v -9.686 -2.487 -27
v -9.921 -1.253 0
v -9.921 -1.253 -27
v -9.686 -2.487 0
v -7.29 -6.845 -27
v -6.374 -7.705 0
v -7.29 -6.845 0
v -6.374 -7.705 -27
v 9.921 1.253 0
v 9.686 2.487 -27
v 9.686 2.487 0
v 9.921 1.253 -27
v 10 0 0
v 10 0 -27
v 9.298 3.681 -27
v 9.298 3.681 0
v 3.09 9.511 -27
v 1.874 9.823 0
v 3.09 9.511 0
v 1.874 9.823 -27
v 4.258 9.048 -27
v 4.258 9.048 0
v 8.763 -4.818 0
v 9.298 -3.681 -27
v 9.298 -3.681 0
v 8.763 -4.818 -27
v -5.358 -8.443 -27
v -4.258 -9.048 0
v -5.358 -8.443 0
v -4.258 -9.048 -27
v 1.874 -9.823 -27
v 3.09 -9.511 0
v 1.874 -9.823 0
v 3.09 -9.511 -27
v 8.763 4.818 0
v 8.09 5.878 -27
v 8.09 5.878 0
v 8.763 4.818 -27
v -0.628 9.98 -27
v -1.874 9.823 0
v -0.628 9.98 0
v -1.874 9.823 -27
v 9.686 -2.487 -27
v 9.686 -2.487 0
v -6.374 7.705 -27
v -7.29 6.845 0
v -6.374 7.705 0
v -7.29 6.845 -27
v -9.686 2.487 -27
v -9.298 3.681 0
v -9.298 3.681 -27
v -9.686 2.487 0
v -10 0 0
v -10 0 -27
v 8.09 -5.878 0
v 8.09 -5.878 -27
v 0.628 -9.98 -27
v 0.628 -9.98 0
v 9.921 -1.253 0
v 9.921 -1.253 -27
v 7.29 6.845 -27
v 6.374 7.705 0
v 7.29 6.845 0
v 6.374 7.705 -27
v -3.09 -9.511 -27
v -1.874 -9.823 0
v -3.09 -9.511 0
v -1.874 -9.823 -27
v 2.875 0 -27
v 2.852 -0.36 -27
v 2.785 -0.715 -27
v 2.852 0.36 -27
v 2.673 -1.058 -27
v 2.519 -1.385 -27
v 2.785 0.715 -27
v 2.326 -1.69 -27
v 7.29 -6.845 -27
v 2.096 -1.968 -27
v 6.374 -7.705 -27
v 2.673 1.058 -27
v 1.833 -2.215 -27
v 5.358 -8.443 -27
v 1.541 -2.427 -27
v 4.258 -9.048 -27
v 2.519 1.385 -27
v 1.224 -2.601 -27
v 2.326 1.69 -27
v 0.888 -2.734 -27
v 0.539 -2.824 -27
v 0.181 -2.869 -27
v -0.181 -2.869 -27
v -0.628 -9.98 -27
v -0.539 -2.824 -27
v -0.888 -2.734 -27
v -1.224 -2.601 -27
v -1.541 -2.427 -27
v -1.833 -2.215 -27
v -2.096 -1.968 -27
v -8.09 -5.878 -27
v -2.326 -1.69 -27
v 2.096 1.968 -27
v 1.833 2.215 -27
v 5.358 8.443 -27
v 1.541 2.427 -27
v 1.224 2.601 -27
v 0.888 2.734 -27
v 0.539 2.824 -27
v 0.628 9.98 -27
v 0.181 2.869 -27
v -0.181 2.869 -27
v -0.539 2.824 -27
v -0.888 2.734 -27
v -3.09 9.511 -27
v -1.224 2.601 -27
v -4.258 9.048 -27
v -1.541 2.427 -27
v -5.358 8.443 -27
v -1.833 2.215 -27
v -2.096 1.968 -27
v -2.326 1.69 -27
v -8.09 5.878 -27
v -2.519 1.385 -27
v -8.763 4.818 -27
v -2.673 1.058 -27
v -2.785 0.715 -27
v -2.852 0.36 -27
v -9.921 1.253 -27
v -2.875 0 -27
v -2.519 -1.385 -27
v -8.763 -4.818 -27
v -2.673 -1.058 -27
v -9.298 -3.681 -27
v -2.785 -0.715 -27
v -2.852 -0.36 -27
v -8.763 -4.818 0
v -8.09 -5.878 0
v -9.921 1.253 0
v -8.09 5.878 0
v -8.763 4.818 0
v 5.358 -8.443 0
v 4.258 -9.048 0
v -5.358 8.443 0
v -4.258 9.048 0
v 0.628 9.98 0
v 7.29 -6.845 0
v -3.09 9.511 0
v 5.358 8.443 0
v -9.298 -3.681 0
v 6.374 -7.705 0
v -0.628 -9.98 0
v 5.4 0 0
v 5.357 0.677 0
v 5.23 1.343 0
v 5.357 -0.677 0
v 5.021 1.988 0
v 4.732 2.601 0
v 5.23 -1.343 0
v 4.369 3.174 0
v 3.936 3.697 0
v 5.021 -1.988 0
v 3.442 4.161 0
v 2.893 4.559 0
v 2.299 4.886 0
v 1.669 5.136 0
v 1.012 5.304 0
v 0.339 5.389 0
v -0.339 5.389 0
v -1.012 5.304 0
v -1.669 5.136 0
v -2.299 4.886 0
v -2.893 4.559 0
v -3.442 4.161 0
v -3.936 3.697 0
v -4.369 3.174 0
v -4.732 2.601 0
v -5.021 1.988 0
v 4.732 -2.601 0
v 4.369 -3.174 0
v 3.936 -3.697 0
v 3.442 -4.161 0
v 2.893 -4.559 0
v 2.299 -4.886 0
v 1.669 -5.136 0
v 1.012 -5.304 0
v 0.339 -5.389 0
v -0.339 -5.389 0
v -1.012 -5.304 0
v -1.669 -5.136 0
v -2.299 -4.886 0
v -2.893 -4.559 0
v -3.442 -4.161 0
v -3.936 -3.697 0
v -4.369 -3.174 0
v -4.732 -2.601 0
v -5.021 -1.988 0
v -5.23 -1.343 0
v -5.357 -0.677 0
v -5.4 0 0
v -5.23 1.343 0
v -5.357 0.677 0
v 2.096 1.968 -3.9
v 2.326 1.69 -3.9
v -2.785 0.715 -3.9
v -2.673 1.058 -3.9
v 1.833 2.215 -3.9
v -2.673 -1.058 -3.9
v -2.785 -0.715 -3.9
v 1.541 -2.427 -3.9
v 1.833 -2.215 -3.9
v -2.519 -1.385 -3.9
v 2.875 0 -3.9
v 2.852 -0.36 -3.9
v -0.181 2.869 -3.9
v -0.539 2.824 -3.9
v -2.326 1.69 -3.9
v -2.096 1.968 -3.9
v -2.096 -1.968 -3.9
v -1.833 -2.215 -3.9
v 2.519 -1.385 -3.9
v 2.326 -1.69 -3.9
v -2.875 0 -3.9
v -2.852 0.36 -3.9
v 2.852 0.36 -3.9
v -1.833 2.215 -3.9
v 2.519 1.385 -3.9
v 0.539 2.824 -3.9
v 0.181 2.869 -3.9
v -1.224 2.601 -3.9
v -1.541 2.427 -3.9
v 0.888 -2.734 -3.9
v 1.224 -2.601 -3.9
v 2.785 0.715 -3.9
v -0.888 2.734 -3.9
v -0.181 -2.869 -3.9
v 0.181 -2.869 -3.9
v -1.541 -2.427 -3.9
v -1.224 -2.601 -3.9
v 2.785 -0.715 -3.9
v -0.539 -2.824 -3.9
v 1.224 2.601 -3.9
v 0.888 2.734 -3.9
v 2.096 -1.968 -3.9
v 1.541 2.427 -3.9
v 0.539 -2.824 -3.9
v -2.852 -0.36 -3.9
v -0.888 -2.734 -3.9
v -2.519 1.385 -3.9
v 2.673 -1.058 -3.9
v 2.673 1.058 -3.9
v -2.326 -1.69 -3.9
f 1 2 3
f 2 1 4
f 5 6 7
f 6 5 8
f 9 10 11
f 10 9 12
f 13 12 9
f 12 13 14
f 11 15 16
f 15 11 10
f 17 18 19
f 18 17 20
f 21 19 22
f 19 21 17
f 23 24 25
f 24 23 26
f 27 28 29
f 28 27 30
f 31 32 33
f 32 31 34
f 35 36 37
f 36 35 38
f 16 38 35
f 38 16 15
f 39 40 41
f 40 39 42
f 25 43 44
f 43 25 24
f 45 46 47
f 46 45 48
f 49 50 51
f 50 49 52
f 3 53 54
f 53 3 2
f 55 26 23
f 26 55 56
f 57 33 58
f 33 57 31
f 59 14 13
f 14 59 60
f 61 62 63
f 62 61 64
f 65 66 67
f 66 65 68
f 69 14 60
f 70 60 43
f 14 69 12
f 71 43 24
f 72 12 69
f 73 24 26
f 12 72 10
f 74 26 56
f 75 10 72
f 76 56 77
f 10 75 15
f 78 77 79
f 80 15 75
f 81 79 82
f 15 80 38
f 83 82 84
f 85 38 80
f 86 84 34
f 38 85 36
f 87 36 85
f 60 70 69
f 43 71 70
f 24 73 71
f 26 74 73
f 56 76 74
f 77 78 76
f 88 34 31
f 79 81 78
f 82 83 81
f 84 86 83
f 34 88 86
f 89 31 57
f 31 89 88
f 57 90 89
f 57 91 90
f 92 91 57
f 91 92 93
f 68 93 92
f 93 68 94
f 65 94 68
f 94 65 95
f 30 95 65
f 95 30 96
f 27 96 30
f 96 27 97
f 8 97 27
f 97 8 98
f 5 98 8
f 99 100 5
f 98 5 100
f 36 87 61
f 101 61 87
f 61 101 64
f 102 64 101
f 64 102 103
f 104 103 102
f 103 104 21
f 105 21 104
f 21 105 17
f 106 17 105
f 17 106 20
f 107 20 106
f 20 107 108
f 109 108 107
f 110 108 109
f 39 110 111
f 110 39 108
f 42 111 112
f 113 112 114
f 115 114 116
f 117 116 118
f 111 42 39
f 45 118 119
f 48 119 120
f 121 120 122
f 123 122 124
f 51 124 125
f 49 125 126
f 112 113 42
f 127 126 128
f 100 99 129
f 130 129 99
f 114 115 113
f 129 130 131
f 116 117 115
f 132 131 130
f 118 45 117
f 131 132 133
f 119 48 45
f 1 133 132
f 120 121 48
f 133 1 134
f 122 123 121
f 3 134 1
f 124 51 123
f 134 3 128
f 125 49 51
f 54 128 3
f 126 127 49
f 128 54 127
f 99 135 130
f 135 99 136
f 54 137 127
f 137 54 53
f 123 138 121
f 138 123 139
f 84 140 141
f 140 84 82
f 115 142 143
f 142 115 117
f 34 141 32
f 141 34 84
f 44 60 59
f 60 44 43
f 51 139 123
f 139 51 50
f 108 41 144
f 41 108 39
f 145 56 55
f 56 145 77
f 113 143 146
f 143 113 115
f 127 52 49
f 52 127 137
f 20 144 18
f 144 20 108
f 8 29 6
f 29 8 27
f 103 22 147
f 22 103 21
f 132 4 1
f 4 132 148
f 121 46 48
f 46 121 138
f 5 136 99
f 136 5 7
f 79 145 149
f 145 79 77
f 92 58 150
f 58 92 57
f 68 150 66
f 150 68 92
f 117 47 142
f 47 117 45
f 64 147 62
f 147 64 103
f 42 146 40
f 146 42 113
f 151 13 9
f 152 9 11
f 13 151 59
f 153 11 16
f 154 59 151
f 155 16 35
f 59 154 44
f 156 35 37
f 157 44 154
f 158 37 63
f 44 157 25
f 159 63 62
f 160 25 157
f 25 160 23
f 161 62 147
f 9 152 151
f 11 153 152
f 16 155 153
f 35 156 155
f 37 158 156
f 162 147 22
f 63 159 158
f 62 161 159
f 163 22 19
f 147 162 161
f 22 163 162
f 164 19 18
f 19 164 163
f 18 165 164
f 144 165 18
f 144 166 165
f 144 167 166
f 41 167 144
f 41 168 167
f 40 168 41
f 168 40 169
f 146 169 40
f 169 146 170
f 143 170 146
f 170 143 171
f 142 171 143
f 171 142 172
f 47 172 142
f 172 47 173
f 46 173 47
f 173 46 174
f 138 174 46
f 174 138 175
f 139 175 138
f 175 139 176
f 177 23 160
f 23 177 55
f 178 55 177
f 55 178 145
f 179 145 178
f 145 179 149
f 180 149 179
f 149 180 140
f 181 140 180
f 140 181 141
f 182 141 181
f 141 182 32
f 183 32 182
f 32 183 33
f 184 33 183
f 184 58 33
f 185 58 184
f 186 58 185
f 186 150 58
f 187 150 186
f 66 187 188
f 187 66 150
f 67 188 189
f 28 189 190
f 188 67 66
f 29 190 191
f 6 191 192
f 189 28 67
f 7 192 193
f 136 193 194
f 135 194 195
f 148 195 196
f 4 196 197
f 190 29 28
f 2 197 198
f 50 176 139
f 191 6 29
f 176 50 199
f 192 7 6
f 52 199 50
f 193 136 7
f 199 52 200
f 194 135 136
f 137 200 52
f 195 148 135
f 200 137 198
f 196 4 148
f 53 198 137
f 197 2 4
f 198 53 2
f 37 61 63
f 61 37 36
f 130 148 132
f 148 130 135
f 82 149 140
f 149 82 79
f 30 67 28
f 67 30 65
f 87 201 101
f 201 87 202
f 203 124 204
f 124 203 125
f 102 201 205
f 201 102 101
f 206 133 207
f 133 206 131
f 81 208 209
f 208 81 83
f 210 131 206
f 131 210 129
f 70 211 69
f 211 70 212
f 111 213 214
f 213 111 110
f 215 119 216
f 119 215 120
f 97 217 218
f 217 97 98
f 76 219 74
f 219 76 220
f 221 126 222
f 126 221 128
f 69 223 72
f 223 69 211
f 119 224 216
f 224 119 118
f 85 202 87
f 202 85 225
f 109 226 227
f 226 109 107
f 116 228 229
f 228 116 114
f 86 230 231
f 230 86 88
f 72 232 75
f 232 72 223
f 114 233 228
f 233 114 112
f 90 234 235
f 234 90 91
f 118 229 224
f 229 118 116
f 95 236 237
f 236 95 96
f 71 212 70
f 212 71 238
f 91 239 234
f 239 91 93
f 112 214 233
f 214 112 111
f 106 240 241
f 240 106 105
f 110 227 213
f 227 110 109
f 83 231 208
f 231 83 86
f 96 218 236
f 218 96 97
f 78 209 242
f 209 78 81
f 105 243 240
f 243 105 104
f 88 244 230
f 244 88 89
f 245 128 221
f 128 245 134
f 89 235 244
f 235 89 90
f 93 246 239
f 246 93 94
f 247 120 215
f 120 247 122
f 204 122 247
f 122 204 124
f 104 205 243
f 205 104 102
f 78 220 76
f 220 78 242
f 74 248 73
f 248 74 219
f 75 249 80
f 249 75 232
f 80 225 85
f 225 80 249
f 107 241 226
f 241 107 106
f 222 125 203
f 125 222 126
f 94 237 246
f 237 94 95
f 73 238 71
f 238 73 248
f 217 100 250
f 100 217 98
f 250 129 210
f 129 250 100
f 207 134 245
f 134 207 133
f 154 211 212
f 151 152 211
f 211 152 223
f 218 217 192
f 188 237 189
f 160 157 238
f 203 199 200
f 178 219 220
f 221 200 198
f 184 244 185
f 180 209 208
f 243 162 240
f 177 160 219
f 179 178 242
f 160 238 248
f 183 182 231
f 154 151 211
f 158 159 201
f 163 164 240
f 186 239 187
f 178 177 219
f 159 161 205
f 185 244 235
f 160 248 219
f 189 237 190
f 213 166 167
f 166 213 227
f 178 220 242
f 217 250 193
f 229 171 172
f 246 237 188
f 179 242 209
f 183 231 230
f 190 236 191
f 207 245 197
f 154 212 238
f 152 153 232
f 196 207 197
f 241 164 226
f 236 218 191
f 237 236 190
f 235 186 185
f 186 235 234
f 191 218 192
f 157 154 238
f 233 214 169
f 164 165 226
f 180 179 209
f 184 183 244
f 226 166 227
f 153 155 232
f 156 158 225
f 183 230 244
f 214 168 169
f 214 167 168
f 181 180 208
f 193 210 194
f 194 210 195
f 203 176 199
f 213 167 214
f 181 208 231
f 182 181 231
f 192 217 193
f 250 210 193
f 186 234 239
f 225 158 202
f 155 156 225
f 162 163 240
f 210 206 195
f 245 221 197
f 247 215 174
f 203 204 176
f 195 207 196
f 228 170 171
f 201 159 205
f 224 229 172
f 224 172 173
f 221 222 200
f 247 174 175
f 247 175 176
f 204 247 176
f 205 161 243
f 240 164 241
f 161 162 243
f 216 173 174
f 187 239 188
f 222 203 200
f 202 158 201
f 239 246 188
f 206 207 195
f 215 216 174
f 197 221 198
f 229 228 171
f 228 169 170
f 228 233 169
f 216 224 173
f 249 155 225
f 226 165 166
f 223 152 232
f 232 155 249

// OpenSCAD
$fn = 50;

difference() {
	union() {
		translate(v = [0, 0, -27.0]) {
			cylinder(h = 27, r = 10.0);
		}
		#translate(v = [0, 0, -30.0]) {
			cylinder(h = 30, r = 2.875);
		}
	}
	union() {
		translate(v = [0, 0, 0]) {
			rotate(a = [0, 0, 0]) {
				difference() {
					union() {
						translate(v = [0, 0, -30.0]) {
							cylinder(h = 30, r = 2.6);
						}
						translate(v = [0, 0, -3.9]) {
							cylinder(h = 3.9, r1 = 2.875, r2 = 5.4);
						}
						translate(v = [0, 0, -30.0]) {
							cylinder(h = 30, r = 2.875);
						}
						translate(v = [0, 0, -30.0]) {
							cylinder(h = 30, r = 2.6);
						}
					}
					union();
				}
			}
		}
	}
}
